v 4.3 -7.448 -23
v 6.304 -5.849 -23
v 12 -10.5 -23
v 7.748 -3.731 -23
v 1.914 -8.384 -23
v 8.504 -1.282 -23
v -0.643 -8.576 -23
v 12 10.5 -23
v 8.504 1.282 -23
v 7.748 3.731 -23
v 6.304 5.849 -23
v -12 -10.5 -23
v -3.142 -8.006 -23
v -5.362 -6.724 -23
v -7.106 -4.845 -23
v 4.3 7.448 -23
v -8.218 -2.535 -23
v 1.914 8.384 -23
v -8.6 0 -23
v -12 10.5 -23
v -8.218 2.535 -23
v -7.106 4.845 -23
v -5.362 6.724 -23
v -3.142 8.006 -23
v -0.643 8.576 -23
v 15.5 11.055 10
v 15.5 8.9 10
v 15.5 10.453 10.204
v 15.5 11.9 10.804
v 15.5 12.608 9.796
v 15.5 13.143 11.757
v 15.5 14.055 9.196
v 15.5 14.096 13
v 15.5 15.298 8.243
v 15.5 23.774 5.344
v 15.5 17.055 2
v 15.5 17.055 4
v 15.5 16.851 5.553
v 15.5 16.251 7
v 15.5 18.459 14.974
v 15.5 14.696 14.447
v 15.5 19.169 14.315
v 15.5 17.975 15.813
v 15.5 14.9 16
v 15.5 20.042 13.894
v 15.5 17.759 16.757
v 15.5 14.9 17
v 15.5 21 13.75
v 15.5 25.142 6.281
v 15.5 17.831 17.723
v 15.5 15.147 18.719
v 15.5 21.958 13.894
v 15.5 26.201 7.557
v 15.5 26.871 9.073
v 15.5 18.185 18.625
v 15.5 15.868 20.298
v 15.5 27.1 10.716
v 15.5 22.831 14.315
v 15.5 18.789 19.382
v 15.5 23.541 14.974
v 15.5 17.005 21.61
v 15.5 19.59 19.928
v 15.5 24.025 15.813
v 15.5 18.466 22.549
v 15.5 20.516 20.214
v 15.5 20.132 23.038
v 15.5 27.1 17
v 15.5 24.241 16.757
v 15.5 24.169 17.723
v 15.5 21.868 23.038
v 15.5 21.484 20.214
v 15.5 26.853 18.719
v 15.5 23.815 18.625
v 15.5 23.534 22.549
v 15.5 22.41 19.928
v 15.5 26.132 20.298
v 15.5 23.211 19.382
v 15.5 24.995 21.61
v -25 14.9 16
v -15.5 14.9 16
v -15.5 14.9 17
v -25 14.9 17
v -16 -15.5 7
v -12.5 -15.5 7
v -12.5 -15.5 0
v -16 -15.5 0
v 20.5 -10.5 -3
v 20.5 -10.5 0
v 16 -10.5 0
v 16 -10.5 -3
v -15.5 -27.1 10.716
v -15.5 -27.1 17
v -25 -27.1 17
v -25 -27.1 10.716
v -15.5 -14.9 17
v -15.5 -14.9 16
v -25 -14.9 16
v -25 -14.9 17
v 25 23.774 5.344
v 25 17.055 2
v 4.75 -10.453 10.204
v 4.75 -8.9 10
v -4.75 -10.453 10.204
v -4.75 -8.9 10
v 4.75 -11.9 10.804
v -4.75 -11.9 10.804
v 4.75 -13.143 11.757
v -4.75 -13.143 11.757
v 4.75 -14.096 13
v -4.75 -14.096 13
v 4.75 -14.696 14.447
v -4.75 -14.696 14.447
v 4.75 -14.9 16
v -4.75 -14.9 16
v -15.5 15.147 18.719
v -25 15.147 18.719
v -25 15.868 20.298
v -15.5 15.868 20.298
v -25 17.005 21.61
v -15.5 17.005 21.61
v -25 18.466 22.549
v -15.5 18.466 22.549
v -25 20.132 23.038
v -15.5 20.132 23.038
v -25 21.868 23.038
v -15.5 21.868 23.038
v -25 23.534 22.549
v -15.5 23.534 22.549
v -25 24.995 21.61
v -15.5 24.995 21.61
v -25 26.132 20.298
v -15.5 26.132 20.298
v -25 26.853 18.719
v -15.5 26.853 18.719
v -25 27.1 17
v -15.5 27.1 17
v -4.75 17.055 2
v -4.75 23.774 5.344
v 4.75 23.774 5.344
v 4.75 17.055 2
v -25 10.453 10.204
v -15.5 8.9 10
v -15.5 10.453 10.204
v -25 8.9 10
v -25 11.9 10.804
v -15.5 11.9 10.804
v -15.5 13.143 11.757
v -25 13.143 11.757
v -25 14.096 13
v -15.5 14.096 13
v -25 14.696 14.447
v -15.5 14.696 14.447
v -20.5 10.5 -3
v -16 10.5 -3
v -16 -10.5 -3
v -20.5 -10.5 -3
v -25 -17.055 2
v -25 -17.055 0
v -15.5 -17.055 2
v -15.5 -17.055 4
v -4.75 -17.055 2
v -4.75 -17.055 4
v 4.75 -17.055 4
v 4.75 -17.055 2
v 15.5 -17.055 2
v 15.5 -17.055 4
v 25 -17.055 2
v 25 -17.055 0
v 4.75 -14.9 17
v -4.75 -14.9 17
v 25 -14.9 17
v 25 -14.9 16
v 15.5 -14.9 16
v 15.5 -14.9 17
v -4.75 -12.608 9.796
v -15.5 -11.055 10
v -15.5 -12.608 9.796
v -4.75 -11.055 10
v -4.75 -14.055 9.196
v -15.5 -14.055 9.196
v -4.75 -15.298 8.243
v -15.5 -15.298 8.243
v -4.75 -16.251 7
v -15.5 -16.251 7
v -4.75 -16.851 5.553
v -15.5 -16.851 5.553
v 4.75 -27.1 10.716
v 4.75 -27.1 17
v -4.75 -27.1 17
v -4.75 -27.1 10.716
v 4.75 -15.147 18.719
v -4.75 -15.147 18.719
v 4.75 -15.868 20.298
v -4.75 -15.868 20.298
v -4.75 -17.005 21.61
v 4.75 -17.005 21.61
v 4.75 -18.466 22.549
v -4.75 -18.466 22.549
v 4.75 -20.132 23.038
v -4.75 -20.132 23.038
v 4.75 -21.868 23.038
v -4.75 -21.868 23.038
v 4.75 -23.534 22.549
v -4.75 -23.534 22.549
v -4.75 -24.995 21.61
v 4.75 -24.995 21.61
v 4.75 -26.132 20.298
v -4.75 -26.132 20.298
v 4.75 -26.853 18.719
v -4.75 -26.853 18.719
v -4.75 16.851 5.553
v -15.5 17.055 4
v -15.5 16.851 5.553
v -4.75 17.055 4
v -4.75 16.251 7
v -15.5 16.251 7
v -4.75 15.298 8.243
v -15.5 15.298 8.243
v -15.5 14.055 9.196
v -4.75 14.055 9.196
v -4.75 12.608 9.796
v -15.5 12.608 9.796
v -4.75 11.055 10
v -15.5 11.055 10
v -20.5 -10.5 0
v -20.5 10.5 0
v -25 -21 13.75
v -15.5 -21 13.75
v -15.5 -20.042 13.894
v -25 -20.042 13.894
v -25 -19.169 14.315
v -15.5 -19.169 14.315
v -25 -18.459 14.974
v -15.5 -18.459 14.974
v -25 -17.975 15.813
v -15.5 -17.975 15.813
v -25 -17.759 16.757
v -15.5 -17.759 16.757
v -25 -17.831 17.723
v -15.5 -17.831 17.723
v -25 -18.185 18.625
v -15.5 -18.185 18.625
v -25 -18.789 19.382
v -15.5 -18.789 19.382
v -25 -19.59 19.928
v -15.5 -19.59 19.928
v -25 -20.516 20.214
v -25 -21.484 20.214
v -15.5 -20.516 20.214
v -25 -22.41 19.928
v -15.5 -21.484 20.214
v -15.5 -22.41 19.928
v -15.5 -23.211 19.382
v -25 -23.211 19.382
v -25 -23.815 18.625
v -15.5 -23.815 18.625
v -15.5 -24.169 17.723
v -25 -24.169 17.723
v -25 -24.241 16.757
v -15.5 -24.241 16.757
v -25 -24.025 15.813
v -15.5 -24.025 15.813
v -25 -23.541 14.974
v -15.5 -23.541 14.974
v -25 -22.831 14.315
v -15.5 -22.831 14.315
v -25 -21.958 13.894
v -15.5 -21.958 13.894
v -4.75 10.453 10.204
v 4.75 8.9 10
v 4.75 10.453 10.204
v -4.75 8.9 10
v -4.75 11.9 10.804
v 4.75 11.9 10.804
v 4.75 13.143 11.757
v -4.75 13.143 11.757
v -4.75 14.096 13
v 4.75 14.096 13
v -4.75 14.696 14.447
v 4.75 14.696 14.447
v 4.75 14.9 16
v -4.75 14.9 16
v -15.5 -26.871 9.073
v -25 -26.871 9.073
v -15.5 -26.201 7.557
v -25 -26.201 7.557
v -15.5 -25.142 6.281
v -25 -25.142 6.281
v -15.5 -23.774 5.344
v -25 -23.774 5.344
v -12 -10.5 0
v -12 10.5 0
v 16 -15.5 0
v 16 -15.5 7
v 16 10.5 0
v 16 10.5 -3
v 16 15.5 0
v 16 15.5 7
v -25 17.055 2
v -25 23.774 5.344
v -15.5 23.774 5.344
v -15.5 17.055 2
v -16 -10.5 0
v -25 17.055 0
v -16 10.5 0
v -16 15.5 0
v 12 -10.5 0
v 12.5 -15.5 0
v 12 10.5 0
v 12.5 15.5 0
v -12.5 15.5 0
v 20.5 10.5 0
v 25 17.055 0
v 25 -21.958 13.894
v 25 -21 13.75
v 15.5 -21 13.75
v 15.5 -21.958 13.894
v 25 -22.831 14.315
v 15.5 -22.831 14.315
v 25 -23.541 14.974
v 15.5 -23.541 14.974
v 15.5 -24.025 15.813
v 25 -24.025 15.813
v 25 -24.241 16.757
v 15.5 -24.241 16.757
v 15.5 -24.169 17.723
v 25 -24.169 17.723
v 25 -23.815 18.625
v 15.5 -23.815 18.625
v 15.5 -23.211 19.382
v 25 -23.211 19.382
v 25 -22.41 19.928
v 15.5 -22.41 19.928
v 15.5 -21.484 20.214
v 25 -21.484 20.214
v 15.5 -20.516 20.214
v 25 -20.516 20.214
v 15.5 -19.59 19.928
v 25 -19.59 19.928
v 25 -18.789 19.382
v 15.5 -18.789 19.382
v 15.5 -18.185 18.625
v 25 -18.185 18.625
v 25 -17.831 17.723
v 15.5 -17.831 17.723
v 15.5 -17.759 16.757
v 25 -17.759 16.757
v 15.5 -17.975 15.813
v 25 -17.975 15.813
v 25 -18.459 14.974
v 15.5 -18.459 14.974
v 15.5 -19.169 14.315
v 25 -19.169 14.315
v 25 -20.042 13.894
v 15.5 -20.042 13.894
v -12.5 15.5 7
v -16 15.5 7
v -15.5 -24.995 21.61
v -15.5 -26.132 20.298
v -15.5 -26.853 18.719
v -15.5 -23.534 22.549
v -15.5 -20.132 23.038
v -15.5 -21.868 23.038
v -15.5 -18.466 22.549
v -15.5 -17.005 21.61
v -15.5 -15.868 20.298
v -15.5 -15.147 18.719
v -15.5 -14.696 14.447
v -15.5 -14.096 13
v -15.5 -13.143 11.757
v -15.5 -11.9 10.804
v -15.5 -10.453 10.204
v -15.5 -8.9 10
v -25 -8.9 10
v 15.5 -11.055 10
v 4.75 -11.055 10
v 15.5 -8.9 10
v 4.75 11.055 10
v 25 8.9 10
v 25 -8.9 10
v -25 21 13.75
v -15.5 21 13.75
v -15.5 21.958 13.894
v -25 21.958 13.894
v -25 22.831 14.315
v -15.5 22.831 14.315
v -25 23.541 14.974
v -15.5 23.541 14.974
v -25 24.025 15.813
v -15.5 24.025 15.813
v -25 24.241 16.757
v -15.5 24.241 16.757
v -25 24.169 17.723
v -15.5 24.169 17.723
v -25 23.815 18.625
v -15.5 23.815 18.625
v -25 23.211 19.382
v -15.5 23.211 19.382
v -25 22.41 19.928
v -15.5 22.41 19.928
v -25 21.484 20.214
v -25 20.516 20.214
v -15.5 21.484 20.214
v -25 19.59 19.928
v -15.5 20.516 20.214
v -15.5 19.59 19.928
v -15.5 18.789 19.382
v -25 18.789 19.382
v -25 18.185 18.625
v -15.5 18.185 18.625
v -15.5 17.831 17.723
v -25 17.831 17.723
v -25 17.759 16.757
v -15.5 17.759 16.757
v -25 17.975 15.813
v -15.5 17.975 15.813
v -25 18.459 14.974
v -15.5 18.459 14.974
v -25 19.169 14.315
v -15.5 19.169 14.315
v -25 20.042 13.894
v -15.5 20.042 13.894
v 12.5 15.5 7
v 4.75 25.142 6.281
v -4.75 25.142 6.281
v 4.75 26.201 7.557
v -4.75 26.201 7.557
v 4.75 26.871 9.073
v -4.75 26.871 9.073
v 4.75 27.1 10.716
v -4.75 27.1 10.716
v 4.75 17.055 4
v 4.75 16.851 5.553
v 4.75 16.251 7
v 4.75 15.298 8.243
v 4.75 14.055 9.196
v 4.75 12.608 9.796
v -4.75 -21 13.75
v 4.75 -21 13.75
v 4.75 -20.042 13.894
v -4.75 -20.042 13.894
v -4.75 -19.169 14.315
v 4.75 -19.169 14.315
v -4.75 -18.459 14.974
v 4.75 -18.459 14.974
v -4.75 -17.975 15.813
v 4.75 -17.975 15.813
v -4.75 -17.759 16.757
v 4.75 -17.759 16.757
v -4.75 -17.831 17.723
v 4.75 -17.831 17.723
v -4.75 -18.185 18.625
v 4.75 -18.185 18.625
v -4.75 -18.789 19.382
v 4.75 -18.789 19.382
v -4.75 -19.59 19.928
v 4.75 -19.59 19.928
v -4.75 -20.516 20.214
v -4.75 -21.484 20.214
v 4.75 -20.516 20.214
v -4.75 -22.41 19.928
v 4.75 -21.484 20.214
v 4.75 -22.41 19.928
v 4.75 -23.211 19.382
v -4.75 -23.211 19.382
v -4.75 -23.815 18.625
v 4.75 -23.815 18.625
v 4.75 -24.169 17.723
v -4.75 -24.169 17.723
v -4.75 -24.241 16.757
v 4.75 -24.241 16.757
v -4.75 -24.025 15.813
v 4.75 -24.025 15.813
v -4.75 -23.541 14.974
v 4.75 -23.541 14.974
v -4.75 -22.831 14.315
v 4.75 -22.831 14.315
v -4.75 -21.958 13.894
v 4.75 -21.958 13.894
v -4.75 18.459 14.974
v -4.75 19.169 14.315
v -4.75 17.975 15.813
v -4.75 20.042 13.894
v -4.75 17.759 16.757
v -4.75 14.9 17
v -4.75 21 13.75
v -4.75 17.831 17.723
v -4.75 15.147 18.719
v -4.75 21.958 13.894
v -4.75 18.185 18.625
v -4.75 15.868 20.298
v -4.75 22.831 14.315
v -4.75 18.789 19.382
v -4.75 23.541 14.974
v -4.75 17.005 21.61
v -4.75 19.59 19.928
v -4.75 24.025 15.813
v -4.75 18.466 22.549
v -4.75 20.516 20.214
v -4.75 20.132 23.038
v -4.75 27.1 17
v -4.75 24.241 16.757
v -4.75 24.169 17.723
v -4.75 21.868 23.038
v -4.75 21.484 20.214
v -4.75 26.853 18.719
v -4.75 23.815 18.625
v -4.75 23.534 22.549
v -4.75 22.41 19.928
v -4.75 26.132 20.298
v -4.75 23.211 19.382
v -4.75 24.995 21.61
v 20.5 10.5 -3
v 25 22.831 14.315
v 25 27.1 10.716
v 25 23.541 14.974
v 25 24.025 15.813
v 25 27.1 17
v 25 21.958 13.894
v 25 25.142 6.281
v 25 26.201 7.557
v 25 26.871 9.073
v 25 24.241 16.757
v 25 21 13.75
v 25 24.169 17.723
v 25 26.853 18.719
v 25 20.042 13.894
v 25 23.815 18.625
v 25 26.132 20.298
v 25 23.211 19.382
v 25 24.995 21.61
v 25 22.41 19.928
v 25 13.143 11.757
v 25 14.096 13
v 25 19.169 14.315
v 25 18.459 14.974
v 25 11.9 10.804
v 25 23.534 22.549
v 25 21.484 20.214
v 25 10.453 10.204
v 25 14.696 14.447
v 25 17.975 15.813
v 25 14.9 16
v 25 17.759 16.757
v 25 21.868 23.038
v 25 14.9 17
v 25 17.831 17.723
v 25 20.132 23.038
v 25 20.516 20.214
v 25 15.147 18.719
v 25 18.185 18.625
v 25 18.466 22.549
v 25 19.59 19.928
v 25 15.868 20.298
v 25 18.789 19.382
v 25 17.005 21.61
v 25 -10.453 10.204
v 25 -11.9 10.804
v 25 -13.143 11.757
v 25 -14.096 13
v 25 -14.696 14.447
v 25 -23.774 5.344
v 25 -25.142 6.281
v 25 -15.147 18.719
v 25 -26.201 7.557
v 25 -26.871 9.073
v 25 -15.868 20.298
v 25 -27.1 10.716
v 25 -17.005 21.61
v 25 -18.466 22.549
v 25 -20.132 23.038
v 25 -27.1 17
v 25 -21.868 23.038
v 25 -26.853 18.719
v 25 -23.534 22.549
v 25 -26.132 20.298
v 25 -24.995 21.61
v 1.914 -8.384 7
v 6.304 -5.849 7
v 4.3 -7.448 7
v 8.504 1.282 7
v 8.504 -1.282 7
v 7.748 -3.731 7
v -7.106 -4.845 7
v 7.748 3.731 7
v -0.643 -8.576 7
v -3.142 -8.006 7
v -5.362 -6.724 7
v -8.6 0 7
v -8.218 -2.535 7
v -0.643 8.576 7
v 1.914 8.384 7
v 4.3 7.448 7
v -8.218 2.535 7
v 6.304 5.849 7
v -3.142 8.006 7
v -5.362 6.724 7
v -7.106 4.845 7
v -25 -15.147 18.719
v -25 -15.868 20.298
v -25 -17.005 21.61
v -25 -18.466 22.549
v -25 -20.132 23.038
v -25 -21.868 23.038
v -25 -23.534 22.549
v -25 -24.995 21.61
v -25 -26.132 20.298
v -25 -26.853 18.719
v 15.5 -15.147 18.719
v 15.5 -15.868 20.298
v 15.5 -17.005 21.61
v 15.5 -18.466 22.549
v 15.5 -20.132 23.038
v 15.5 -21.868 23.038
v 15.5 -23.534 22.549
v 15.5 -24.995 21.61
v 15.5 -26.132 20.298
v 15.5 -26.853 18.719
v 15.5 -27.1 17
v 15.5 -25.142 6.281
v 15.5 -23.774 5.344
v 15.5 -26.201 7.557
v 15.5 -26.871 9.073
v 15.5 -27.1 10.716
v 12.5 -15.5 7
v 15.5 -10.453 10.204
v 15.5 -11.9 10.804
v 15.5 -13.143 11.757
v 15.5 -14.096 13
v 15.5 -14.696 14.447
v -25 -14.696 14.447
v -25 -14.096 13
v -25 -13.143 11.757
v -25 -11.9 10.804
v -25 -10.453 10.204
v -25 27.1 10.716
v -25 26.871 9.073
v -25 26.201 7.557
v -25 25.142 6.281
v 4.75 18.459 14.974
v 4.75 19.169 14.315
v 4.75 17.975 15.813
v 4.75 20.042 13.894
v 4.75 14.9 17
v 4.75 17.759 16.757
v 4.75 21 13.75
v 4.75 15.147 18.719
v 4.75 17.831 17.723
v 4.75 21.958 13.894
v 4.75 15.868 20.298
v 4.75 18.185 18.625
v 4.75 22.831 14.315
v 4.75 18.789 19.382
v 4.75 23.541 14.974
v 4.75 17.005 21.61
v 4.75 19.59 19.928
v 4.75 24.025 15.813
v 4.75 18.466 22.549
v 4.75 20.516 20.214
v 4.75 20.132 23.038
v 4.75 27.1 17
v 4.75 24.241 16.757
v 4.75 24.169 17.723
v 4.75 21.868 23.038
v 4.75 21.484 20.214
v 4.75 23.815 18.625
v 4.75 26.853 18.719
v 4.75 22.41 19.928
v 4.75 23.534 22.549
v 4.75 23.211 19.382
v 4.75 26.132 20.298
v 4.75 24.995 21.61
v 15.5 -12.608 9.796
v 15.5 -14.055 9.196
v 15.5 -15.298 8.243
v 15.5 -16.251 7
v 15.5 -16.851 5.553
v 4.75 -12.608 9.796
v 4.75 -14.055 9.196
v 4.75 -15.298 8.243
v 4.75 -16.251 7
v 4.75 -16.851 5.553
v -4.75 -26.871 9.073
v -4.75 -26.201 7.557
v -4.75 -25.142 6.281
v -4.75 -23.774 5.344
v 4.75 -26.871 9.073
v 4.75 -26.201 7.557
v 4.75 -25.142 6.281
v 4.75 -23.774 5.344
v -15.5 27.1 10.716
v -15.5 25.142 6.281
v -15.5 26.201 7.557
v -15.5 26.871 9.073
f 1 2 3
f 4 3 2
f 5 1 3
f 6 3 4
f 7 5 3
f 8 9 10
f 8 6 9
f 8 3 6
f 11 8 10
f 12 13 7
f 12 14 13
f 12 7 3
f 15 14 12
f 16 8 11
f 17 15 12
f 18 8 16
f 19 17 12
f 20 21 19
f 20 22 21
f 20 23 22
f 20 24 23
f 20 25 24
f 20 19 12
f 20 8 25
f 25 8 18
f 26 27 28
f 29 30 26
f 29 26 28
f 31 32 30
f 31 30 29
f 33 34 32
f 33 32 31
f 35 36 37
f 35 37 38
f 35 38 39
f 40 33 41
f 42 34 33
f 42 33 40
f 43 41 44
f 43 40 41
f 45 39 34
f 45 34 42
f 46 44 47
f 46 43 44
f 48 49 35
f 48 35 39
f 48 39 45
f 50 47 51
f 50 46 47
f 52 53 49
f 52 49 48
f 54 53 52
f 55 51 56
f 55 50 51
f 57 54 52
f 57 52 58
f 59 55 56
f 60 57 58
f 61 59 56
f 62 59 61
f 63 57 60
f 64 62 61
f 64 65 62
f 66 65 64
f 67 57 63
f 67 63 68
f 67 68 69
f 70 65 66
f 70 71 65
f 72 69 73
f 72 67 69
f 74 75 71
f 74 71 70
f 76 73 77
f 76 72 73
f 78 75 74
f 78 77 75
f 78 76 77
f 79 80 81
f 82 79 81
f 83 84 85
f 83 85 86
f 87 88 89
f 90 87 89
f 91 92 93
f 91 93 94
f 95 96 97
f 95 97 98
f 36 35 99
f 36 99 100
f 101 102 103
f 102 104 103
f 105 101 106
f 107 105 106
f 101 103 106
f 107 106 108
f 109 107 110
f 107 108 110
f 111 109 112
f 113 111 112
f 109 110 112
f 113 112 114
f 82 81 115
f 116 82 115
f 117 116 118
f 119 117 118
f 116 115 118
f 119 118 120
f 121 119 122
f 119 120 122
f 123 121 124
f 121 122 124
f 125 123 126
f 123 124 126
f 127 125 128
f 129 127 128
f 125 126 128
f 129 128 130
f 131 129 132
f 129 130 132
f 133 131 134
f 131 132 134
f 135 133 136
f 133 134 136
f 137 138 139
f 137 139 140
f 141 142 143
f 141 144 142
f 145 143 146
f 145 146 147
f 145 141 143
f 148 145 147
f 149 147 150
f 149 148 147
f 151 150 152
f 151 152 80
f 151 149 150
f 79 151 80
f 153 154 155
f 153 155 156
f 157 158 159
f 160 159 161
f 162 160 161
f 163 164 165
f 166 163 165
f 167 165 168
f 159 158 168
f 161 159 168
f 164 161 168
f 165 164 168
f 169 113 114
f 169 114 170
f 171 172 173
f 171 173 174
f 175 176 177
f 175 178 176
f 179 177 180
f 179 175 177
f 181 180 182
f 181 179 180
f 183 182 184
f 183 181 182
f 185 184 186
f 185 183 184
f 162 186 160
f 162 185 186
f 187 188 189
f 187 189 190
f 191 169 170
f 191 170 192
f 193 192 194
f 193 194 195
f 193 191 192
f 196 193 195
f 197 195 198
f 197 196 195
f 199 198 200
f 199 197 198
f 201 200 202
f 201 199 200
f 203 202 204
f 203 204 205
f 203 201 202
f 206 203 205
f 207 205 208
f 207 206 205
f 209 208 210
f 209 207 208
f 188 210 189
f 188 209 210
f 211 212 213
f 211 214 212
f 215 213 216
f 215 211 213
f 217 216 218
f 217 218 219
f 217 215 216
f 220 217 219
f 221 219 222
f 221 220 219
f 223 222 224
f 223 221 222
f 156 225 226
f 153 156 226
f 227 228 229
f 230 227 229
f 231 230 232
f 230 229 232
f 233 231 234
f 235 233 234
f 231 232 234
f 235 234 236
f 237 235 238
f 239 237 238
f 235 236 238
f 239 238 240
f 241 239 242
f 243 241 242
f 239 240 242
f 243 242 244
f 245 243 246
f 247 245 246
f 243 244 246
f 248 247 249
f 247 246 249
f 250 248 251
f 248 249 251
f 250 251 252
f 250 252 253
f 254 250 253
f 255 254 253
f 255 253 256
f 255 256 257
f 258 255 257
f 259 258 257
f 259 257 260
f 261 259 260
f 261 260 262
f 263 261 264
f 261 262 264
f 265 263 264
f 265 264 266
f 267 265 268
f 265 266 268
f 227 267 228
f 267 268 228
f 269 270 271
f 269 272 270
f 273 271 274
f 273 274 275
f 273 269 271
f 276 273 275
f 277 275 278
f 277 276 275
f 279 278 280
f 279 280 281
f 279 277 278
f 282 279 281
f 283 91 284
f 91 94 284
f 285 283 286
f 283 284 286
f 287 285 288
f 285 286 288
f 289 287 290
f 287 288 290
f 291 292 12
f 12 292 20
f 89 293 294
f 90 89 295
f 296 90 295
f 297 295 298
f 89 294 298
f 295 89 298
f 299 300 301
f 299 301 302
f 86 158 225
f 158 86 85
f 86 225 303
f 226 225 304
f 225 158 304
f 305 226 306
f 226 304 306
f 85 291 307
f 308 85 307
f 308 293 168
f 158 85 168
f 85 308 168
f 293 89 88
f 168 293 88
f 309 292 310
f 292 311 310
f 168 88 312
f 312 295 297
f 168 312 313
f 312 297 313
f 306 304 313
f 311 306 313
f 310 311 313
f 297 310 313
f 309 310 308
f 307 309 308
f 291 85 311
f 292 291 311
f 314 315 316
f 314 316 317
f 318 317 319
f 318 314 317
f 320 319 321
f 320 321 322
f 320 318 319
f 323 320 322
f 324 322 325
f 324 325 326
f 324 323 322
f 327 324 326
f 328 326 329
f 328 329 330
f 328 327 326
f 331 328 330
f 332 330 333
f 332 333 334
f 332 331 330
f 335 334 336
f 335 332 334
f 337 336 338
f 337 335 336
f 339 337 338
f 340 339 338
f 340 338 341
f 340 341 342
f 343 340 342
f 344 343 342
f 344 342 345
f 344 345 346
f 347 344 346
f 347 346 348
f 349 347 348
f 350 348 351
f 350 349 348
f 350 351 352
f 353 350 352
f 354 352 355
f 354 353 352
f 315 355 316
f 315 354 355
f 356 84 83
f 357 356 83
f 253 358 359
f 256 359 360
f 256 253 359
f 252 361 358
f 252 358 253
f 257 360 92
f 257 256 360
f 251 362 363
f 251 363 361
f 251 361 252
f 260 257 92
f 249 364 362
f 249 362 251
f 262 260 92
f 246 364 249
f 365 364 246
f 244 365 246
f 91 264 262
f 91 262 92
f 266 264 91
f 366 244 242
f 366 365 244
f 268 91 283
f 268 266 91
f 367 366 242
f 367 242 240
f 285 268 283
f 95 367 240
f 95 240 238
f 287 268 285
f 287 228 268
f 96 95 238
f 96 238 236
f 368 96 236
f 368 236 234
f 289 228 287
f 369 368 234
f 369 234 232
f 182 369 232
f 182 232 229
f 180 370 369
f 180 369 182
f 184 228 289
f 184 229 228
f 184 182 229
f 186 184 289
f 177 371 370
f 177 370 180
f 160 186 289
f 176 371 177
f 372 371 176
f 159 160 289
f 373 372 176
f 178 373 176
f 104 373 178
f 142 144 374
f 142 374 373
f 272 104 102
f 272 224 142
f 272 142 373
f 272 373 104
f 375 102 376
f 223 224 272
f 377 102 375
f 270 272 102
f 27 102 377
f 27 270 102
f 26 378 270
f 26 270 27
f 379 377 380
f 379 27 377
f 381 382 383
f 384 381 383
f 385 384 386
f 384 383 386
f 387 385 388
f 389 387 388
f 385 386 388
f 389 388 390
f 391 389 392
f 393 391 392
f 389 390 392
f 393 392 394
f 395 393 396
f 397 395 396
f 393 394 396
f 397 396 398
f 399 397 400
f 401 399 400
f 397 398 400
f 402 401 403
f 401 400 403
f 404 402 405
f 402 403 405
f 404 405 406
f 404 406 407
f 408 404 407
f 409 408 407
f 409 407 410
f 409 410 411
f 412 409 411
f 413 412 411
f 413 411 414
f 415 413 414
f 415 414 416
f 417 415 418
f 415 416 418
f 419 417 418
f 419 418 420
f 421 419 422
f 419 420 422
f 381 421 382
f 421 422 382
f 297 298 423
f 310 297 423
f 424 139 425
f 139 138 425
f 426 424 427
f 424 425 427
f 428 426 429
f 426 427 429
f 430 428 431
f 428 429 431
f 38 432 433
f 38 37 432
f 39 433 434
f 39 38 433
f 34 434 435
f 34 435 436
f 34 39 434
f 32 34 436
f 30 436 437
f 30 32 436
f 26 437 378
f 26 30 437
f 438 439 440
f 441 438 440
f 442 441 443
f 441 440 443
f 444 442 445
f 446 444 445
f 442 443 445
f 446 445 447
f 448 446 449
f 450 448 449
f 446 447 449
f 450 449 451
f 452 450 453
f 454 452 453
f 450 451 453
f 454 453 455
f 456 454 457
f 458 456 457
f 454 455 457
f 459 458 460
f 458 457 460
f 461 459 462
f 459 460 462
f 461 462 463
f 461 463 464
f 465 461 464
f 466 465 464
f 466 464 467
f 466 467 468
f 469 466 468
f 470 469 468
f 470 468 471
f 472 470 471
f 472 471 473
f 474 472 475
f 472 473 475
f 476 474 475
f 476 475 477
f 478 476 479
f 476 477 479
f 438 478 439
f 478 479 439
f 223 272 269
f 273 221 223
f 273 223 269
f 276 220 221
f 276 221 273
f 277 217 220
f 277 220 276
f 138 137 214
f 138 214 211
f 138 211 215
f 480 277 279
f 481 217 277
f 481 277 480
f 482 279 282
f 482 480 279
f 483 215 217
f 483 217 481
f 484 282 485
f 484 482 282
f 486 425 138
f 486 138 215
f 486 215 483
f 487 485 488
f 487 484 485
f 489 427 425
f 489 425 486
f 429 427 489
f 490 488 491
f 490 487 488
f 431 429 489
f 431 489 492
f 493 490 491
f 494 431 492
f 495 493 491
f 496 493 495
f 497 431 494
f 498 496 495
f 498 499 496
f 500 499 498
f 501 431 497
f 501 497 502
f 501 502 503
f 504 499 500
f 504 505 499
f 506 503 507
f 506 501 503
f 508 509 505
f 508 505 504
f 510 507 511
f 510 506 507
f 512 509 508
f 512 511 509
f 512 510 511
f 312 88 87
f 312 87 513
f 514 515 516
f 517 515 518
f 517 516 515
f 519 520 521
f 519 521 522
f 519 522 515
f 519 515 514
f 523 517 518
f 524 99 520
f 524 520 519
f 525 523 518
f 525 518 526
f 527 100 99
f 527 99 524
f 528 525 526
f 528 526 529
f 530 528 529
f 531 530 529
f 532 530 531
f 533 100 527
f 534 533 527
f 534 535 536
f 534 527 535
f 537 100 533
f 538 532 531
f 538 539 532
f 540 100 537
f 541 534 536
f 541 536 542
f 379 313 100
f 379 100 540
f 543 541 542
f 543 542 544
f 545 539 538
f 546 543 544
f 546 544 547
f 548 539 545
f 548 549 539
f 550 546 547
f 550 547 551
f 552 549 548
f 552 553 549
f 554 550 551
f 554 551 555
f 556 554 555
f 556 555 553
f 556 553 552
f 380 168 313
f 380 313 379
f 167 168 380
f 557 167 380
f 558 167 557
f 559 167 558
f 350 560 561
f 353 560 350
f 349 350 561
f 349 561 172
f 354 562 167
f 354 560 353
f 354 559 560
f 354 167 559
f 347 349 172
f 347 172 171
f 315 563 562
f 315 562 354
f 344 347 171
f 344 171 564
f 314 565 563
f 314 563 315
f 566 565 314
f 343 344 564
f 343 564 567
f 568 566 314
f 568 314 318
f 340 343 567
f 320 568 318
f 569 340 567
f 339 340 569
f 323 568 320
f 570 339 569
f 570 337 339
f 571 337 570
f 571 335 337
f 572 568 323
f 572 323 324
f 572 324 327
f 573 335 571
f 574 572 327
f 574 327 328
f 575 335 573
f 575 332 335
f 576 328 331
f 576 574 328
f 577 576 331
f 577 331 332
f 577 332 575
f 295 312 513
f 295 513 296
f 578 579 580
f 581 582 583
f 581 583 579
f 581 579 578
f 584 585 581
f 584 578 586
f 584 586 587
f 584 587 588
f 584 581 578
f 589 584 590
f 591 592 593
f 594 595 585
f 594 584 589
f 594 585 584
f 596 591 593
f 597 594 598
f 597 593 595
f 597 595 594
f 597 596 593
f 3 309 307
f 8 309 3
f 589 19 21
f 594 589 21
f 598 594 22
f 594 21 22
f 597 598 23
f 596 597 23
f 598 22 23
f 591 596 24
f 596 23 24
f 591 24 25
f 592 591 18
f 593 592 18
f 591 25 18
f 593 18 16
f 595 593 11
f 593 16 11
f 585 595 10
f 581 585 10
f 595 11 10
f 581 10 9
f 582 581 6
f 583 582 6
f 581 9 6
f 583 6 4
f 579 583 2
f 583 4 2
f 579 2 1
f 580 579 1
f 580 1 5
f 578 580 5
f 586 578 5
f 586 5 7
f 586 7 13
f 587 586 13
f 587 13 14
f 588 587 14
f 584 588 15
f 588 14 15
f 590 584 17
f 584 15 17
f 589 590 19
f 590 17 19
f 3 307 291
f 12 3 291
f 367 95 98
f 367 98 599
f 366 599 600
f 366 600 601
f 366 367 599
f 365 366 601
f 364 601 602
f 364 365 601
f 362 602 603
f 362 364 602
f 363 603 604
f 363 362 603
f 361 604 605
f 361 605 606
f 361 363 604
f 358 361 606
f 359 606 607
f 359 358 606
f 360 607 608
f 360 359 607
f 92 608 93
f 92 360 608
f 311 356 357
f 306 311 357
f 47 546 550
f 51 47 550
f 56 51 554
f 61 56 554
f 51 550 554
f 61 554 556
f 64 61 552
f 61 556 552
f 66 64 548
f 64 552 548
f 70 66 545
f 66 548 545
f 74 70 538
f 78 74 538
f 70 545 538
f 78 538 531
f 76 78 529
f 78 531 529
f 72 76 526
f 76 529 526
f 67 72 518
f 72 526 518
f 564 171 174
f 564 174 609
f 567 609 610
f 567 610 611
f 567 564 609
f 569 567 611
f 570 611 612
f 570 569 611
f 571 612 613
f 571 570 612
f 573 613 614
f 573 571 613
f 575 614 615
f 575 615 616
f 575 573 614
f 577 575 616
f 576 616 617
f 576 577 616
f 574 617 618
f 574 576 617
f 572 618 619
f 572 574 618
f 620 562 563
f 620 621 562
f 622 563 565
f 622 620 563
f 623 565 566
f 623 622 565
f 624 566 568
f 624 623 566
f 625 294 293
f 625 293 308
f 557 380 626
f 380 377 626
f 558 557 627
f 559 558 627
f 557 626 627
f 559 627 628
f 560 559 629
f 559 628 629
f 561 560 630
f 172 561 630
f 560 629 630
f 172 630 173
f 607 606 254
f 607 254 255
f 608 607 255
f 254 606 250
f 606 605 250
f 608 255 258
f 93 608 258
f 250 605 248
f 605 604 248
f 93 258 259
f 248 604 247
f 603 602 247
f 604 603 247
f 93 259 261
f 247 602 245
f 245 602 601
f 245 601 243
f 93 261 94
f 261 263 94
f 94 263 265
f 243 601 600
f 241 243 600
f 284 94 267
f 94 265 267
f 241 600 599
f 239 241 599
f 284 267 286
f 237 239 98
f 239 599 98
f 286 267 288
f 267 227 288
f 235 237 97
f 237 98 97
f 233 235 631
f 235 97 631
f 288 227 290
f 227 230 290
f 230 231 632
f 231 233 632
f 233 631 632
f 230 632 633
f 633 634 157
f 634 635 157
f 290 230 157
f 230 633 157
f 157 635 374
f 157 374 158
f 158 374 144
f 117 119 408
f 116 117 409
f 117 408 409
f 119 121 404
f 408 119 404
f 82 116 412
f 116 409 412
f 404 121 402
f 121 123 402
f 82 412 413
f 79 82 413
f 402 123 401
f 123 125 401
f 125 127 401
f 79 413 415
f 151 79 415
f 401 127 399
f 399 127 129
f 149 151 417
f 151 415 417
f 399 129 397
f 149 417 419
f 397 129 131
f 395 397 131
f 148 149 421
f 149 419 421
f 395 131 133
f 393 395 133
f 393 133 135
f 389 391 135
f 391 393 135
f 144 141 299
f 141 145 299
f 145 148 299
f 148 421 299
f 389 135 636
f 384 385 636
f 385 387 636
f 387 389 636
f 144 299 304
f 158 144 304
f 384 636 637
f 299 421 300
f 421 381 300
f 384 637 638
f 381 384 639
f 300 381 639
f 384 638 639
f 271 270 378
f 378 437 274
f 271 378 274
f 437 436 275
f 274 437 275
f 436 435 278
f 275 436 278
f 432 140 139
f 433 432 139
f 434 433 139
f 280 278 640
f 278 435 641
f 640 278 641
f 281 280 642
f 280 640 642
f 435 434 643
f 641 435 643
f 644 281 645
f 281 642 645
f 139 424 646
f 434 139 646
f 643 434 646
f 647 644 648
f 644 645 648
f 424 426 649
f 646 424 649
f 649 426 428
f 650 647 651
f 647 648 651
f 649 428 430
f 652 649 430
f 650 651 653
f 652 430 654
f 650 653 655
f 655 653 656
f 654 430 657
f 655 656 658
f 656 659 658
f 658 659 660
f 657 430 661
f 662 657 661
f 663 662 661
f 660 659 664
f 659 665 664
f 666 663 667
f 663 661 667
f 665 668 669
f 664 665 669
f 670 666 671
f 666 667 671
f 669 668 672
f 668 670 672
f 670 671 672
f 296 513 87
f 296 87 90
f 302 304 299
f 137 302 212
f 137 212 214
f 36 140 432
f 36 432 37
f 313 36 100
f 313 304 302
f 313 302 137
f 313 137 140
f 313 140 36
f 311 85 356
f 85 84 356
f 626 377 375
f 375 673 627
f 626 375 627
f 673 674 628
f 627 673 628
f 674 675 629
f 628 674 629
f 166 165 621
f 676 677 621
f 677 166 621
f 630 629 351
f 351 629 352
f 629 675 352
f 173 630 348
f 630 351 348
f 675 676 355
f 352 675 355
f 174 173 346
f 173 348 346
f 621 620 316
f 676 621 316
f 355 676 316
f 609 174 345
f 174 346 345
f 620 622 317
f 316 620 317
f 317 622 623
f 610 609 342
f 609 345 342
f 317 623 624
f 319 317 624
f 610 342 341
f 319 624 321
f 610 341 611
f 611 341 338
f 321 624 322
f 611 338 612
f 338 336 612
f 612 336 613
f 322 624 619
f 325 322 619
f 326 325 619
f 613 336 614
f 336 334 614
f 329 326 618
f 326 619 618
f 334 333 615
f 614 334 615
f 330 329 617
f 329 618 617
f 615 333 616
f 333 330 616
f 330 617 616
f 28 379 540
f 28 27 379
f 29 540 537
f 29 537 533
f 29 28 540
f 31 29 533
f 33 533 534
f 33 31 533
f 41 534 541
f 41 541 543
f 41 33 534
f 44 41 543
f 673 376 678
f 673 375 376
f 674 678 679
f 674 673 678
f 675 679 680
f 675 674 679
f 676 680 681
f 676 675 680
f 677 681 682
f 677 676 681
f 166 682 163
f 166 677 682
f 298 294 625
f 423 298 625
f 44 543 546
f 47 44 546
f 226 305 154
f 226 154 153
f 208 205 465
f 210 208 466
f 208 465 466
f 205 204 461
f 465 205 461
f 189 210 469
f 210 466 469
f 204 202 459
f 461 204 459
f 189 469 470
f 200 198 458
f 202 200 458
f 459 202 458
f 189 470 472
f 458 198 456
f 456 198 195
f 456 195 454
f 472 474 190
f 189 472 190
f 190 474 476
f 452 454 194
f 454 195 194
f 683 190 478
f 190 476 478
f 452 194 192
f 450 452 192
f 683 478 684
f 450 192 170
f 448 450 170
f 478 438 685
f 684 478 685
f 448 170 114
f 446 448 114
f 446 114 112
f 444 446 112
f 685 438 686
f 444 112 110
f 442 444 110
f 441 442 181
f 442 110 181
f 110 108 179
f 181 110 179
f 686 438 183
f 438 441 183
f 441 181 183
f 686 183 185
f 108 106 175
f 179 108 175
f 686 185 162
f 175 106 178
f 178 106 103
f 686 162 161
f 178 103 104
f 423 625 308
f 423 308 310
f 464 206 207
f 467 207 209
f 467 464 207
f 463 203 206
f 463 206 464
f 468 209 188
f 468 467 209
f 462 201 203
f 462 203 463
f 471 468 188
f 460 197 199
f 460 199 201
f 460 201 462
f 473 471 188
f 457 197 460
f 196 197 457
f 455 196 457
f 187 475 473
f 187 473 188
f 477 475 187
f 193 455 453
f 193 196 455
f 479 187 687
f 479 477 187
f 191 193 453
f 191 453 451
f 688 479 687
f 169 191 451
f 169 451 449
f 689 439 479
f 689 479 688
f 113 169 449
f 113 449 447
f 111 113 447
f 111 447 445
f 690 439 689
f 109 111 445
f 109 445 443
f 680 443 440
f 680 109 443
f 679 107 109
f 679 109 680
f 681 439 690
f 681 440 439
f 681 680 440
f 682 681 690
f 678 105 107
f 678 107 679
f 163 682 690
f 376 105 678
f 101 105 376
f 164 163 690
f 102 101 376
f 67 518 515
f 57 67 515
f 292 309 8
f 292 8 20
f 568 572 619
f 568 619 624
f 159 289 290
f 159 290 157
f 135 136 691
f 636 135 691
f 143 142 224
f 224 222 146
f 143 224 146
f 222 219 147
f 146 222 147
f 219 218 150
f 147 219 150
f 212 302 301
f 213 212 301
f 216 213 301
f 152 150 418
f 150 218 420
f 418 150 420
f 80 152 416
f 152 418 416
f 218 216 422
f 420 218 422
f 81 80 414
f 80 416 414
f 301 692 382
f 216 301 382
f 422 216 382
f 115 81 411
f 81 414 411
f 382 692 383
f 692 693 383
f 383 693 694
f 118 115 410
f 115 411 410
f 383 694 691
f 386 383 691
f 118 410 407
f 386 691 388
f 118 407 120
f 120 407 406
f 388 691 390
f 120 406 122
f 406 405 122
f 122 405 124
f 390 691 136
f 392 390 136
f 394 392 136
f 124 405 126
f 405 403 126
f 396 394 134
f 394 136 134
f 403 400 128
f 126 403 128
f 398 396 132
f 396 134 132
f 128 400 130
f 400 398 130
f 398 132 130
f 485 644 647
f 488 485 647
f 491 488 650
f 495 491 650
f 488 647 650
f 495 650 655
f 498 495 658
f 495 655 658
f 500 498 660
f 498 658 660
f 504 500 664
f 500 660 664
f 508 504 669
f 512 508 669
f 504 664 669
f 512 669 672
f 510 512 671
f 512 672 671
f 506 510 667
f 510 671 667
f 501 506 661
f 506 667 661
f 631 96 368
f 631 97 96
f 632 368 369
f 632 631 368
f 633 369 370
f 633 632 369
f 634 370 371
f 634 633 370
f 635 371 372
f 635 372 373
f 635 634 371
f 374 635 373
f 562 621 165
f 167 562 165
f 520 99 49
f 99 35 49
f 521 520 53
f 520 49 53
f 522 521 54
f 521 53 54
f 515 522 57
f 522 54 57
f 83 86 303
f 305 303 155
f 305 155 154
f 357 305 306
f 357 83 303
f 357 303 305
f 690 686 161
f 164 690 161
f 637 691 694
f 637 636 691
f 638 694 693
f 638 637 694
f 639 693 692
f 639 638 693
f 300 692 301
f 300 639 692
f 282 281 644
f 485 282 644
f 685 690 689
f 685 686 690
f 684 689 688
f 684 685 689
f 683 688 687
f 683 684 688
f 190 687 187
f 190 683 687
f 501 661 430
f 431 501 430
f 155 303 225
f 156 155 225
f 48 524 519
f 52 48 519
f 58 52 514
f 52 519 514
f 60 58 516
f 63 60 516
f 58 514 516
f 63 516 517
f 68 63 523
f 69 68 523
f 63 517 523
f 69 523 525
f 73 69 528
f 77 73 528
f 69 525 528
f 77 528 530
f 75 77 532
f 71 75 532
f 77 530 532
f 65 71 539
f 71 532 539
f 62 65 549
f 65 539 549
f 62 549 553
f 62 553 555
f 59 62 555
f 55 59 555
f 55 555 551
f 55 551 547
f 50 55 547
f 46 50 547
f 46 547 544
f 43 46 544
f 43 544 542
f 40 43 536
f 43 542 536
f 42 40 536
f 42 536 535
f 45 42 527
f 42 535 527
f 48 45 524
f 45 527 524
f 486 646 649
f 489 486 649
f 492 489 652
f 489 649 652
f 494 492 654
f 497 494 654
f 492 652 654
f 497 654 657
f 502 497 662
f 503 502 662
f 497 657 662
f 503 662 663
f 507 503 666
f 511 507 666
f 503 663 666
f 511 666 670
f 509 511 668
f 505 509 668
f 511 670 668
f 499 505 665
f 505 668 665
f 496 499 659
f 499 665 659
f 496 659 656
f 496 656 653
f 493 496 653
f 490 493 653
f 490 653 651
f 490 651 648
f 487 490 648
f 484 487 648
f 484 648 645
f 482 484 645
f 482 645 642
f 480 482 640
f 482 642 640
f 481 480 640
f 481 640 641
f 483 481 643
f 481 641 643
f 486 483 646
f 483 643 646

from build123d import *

# Parameters (mm, degrees)
SKETCH1_W               = 50
SKETCH1_H               = 34.11
BOSS_EXTRUDE1_DEPTH     = 10
SKETCH3_W               = 41
SKETCH3_H               = 21
BOSS_EXTRUDE2_DEPTH     = 3
CUT_EXTRUDE1_DEPTH      = 32.872763059
CUT_EXTRUDE1_DEPTH_BACK = 7
SKETCH2_W               = 3.5
SKETCH2_H               = 31
SKETCH4_W               = 25
SKETCH4_H               = 21
BOSS_EXTRUDE3_DEPTH     = 20
SKETCH5_R               = 8.6
CUT_EXTRUDE2_DEPTH      = 30
SKETCH6_R               = 3.25
BOSS_EXTRUDE4_DEPTH     = 9.5
LPATTERN1_COUNT         = 3
LPATTERN1_PITCH         = 20.25
MIRROR1_COPY_1_SKETCH_R = 3.25
MIRROR1_COPY_1_DEPTH    = 9.5
MIRROR1_COPY_2_SKETCH_R = 3.25
MIRROR1_COPY_2_DEPTH    = 9.5
FILLET1_R               = 6
SKETCH7_W               = 23
SKETCH7_H               = 21
CUT_EXTRUDE3_DEPTH      = 0.5
FILLET2_R               = 6


with BuildPart() as part:
    # Sketch1 → Boss-Extrude1 (new body)
    with BuildSketch(Plane.XY):
        Rectangle(SKETCH1_W, SKETCH1_H)
    extrude(amount=BOSS_EXTRUDE1_DEPTH)

    # Sketch3 → Boss-Extrude2 (add)
    with BuildSketch(Plane(origin=(0, 0, 0), x_dir=(-1, 0, 0), z_dir=(0, 0, -1))):
        Rectangle(SKETCH3_W, SKETCH3_H)
    extrude(amount=BOSS_EXTRUDE2_DEPTH)

    # Sketch2 → Cut-Extrude1 (cut, two sides: drawn at the far end of the back side and taken through both)
    with BuildSketch(Plane(origin=(0, 0, 0), x_dir=(-1, 0, 0), z_dir=(0, 0, -1)).offset(-CUT_EXTRUDE1_DEPTH_BACK)):
        with Locations((-14.25, 0)):
            Rectangle(SKETCH2_W, SKETCH2_H)
        with Locations((14.25, 0)):
            Rectangle(SKETCH2_W, SKETCH2_H)
    extrude(amount=CUT_EXTRUDE1_DEPTH + CUT_EXTRUDE1_DEPTH_BACK, mode=Mode.SUBTRACT)

    # Sketch4 → Boss-Extrude3 (add)
    with BuildSketch(Plane(origin=(0, 0, -3), x_dir=(-1, 0, 0), z_dir=(0, 0, -1))):
        Rectangle(SKETCH4_W, SKETCH4_H)
    extrude(amount=BOSS_EXTRUDE3_DEPTH)

    # Sketch5 → Cut-Extrude2 (cut)
    with BuildSketch(Plane(origin=(0, 0, -23), x_dir=(-1, 0, 0), z_dir=(0, 0, -1))):
        Circle(SKETCH5_R)
    extrude(amount=-CUT_EXTRUDE2_DEPTH, mode=Mode.SUBTRACT)

    # Sketch6 → Boss-Extrude4 (add)
    with BuildSketch(Plane(origin=(25, 0, 0), x_dir=(0, 0, -1), z_dir=(1, 0, 0))):
        with BuildLine():
            Line((-17, 27.1), (-7, 27.1))
            Line((-7, 27.1), (-2, 17.055))
            Line((-2, 17.055), (-10, 17.055))
            Line((-10, 17.055), (-10, 14.9))
            Line((-10, 14.9), (-17, 14.9))
            ThreePointArc((-17, 14.9), (-23.1, 21), (-17, 27.1))
        make_face()
        with Locations((-17, 21)):
            Circle(SKETCH6_R, mode=Mode.SUBTRACT)
    boss_extrude4 = extrude(amount=-BOSS_EXTRUDE4_DEPTH)

    # LPattern1: Boss-Extrude4 ×3
    with Locations(*[(-i * LPATTERN1_PITCH, 0, 0) for i in range(1, LPATTERN1_COUNT)]):
        add(boss_extrude4)

    # Mirror1: Boss-Extrude4 across plane
    add(boss_extrude4.mirror(Plane.ZX))

    # Mirror1 copy 1 sketch → Mirror1 copy 1 (add)
    with BuildSketch(Plane(origin=(4.75, 0, 0), x_dir=(0, 0, -1), z_dir=(1, 0, 0))):
        with BuildLine():
            Line((-17, -27.1), (-7, -27.1))
            Line((-7, -27.1), (-2, -17.055))
            Line((-2, -17.055), (-10, -17.055))
            Line((-10, -17.055), (-10, -14.9))
            Line((-10, -14.9), (-17, -14.9))
            ThreePointArc((-17, -14.9), (-23.1, -21), (-17, -27.1))
        make_face()
        with Locations((-17, -21)):
            Circle(MIRROR1_COPY_1_SKETCH_R, mode=Mode.SUBTRACT)
    extrude(amount=-MIRROR1_COPY_1_DEPTH)

    # Mirror1 copy 2 sketch → Mirror1 copy 2 (add)
    with BuildSketch(Plane(origin=(-15.5, 0, 0), x_dir=(0, 0, -1), z_dir=(1, 0, 0))):
        with BuildLine():
            Line((-17, -27.1), (-7, -27.1))
            Line((-7, -27.1), (-2, -17.055))
            Line((-2, -17.055), (-10, -17.055))
            Line((-10, -17.055), (-10, -14.9))
            Line((-10, -14.9), (-17, -14.9))
            ThreePointArc((-17, -14.9), (-23.1, -21), (-17, -27.1))
        make_face()
        with Locations((-17, -21)):
            Circle(MIRROR1_COPY_2_SKETCH_R, mode=Mode.SUBTRACT)
    extrude(amount=-MIRROR1_COPY_2_DEPTH)

    # Fillet1
    fillet1_edges = [part.edges().sort_by_distance(p)[0] for p in [
        (20.25, 27.1, 7),
        (20.25, 14.9, 10),
        (0, 27.1, 7),
        (0, 14.9, 10),
        (-20.25, 27.1, 7),
        (-20.25, 14.9, 10),
        (20.25, -14.9, 10),
        (20.25, -27.1, 7),
        (0, -14.9, 10),
        (0, -27.1, 7),
        (-20.25, -14.9, 10),
        (-20.25, -27.1, 7),
    ]]
    fillet(fillet1_edges, radius=FILLET1_R)

    # Sketch7 → Cut-Extrude3 (cut)
    with BuildSketch(Plane(origin=(12.5, 0, 0), x_dir=(0, 0, -1), z_dir=(1, 0, 0))):
        with Locations((11.5, 0)):
            Rectangle(SKETCH7_W, SKETCH7_H)
    cut_extrude3 = extrude(amount=-CUT_EXTRUDE3_DEPTH, mode=Mode.SUBTRACT)

    # Mirror2: Cut-Extrude3 across plane
    add(cut_extrude3.mirror(Plane(origin=(0, 0, 0), x_dir=(0, 0, 1), z_dir=(1, 0, 0))), mode=Mode.SUBTRACT)

    # Fillet2
    fillet2_edges = [part.edges().sort_by_distance(p)[0] for p in [
        (10.125, 17.055, 10),
        (-10.125, 17.055, 10),
        (10.125, -17.055, 10),
        (-10.125, -17.055, 10),
    ]]
    fillet(fillet2_edges, radius=FILLET2_R)


solid = part.part
